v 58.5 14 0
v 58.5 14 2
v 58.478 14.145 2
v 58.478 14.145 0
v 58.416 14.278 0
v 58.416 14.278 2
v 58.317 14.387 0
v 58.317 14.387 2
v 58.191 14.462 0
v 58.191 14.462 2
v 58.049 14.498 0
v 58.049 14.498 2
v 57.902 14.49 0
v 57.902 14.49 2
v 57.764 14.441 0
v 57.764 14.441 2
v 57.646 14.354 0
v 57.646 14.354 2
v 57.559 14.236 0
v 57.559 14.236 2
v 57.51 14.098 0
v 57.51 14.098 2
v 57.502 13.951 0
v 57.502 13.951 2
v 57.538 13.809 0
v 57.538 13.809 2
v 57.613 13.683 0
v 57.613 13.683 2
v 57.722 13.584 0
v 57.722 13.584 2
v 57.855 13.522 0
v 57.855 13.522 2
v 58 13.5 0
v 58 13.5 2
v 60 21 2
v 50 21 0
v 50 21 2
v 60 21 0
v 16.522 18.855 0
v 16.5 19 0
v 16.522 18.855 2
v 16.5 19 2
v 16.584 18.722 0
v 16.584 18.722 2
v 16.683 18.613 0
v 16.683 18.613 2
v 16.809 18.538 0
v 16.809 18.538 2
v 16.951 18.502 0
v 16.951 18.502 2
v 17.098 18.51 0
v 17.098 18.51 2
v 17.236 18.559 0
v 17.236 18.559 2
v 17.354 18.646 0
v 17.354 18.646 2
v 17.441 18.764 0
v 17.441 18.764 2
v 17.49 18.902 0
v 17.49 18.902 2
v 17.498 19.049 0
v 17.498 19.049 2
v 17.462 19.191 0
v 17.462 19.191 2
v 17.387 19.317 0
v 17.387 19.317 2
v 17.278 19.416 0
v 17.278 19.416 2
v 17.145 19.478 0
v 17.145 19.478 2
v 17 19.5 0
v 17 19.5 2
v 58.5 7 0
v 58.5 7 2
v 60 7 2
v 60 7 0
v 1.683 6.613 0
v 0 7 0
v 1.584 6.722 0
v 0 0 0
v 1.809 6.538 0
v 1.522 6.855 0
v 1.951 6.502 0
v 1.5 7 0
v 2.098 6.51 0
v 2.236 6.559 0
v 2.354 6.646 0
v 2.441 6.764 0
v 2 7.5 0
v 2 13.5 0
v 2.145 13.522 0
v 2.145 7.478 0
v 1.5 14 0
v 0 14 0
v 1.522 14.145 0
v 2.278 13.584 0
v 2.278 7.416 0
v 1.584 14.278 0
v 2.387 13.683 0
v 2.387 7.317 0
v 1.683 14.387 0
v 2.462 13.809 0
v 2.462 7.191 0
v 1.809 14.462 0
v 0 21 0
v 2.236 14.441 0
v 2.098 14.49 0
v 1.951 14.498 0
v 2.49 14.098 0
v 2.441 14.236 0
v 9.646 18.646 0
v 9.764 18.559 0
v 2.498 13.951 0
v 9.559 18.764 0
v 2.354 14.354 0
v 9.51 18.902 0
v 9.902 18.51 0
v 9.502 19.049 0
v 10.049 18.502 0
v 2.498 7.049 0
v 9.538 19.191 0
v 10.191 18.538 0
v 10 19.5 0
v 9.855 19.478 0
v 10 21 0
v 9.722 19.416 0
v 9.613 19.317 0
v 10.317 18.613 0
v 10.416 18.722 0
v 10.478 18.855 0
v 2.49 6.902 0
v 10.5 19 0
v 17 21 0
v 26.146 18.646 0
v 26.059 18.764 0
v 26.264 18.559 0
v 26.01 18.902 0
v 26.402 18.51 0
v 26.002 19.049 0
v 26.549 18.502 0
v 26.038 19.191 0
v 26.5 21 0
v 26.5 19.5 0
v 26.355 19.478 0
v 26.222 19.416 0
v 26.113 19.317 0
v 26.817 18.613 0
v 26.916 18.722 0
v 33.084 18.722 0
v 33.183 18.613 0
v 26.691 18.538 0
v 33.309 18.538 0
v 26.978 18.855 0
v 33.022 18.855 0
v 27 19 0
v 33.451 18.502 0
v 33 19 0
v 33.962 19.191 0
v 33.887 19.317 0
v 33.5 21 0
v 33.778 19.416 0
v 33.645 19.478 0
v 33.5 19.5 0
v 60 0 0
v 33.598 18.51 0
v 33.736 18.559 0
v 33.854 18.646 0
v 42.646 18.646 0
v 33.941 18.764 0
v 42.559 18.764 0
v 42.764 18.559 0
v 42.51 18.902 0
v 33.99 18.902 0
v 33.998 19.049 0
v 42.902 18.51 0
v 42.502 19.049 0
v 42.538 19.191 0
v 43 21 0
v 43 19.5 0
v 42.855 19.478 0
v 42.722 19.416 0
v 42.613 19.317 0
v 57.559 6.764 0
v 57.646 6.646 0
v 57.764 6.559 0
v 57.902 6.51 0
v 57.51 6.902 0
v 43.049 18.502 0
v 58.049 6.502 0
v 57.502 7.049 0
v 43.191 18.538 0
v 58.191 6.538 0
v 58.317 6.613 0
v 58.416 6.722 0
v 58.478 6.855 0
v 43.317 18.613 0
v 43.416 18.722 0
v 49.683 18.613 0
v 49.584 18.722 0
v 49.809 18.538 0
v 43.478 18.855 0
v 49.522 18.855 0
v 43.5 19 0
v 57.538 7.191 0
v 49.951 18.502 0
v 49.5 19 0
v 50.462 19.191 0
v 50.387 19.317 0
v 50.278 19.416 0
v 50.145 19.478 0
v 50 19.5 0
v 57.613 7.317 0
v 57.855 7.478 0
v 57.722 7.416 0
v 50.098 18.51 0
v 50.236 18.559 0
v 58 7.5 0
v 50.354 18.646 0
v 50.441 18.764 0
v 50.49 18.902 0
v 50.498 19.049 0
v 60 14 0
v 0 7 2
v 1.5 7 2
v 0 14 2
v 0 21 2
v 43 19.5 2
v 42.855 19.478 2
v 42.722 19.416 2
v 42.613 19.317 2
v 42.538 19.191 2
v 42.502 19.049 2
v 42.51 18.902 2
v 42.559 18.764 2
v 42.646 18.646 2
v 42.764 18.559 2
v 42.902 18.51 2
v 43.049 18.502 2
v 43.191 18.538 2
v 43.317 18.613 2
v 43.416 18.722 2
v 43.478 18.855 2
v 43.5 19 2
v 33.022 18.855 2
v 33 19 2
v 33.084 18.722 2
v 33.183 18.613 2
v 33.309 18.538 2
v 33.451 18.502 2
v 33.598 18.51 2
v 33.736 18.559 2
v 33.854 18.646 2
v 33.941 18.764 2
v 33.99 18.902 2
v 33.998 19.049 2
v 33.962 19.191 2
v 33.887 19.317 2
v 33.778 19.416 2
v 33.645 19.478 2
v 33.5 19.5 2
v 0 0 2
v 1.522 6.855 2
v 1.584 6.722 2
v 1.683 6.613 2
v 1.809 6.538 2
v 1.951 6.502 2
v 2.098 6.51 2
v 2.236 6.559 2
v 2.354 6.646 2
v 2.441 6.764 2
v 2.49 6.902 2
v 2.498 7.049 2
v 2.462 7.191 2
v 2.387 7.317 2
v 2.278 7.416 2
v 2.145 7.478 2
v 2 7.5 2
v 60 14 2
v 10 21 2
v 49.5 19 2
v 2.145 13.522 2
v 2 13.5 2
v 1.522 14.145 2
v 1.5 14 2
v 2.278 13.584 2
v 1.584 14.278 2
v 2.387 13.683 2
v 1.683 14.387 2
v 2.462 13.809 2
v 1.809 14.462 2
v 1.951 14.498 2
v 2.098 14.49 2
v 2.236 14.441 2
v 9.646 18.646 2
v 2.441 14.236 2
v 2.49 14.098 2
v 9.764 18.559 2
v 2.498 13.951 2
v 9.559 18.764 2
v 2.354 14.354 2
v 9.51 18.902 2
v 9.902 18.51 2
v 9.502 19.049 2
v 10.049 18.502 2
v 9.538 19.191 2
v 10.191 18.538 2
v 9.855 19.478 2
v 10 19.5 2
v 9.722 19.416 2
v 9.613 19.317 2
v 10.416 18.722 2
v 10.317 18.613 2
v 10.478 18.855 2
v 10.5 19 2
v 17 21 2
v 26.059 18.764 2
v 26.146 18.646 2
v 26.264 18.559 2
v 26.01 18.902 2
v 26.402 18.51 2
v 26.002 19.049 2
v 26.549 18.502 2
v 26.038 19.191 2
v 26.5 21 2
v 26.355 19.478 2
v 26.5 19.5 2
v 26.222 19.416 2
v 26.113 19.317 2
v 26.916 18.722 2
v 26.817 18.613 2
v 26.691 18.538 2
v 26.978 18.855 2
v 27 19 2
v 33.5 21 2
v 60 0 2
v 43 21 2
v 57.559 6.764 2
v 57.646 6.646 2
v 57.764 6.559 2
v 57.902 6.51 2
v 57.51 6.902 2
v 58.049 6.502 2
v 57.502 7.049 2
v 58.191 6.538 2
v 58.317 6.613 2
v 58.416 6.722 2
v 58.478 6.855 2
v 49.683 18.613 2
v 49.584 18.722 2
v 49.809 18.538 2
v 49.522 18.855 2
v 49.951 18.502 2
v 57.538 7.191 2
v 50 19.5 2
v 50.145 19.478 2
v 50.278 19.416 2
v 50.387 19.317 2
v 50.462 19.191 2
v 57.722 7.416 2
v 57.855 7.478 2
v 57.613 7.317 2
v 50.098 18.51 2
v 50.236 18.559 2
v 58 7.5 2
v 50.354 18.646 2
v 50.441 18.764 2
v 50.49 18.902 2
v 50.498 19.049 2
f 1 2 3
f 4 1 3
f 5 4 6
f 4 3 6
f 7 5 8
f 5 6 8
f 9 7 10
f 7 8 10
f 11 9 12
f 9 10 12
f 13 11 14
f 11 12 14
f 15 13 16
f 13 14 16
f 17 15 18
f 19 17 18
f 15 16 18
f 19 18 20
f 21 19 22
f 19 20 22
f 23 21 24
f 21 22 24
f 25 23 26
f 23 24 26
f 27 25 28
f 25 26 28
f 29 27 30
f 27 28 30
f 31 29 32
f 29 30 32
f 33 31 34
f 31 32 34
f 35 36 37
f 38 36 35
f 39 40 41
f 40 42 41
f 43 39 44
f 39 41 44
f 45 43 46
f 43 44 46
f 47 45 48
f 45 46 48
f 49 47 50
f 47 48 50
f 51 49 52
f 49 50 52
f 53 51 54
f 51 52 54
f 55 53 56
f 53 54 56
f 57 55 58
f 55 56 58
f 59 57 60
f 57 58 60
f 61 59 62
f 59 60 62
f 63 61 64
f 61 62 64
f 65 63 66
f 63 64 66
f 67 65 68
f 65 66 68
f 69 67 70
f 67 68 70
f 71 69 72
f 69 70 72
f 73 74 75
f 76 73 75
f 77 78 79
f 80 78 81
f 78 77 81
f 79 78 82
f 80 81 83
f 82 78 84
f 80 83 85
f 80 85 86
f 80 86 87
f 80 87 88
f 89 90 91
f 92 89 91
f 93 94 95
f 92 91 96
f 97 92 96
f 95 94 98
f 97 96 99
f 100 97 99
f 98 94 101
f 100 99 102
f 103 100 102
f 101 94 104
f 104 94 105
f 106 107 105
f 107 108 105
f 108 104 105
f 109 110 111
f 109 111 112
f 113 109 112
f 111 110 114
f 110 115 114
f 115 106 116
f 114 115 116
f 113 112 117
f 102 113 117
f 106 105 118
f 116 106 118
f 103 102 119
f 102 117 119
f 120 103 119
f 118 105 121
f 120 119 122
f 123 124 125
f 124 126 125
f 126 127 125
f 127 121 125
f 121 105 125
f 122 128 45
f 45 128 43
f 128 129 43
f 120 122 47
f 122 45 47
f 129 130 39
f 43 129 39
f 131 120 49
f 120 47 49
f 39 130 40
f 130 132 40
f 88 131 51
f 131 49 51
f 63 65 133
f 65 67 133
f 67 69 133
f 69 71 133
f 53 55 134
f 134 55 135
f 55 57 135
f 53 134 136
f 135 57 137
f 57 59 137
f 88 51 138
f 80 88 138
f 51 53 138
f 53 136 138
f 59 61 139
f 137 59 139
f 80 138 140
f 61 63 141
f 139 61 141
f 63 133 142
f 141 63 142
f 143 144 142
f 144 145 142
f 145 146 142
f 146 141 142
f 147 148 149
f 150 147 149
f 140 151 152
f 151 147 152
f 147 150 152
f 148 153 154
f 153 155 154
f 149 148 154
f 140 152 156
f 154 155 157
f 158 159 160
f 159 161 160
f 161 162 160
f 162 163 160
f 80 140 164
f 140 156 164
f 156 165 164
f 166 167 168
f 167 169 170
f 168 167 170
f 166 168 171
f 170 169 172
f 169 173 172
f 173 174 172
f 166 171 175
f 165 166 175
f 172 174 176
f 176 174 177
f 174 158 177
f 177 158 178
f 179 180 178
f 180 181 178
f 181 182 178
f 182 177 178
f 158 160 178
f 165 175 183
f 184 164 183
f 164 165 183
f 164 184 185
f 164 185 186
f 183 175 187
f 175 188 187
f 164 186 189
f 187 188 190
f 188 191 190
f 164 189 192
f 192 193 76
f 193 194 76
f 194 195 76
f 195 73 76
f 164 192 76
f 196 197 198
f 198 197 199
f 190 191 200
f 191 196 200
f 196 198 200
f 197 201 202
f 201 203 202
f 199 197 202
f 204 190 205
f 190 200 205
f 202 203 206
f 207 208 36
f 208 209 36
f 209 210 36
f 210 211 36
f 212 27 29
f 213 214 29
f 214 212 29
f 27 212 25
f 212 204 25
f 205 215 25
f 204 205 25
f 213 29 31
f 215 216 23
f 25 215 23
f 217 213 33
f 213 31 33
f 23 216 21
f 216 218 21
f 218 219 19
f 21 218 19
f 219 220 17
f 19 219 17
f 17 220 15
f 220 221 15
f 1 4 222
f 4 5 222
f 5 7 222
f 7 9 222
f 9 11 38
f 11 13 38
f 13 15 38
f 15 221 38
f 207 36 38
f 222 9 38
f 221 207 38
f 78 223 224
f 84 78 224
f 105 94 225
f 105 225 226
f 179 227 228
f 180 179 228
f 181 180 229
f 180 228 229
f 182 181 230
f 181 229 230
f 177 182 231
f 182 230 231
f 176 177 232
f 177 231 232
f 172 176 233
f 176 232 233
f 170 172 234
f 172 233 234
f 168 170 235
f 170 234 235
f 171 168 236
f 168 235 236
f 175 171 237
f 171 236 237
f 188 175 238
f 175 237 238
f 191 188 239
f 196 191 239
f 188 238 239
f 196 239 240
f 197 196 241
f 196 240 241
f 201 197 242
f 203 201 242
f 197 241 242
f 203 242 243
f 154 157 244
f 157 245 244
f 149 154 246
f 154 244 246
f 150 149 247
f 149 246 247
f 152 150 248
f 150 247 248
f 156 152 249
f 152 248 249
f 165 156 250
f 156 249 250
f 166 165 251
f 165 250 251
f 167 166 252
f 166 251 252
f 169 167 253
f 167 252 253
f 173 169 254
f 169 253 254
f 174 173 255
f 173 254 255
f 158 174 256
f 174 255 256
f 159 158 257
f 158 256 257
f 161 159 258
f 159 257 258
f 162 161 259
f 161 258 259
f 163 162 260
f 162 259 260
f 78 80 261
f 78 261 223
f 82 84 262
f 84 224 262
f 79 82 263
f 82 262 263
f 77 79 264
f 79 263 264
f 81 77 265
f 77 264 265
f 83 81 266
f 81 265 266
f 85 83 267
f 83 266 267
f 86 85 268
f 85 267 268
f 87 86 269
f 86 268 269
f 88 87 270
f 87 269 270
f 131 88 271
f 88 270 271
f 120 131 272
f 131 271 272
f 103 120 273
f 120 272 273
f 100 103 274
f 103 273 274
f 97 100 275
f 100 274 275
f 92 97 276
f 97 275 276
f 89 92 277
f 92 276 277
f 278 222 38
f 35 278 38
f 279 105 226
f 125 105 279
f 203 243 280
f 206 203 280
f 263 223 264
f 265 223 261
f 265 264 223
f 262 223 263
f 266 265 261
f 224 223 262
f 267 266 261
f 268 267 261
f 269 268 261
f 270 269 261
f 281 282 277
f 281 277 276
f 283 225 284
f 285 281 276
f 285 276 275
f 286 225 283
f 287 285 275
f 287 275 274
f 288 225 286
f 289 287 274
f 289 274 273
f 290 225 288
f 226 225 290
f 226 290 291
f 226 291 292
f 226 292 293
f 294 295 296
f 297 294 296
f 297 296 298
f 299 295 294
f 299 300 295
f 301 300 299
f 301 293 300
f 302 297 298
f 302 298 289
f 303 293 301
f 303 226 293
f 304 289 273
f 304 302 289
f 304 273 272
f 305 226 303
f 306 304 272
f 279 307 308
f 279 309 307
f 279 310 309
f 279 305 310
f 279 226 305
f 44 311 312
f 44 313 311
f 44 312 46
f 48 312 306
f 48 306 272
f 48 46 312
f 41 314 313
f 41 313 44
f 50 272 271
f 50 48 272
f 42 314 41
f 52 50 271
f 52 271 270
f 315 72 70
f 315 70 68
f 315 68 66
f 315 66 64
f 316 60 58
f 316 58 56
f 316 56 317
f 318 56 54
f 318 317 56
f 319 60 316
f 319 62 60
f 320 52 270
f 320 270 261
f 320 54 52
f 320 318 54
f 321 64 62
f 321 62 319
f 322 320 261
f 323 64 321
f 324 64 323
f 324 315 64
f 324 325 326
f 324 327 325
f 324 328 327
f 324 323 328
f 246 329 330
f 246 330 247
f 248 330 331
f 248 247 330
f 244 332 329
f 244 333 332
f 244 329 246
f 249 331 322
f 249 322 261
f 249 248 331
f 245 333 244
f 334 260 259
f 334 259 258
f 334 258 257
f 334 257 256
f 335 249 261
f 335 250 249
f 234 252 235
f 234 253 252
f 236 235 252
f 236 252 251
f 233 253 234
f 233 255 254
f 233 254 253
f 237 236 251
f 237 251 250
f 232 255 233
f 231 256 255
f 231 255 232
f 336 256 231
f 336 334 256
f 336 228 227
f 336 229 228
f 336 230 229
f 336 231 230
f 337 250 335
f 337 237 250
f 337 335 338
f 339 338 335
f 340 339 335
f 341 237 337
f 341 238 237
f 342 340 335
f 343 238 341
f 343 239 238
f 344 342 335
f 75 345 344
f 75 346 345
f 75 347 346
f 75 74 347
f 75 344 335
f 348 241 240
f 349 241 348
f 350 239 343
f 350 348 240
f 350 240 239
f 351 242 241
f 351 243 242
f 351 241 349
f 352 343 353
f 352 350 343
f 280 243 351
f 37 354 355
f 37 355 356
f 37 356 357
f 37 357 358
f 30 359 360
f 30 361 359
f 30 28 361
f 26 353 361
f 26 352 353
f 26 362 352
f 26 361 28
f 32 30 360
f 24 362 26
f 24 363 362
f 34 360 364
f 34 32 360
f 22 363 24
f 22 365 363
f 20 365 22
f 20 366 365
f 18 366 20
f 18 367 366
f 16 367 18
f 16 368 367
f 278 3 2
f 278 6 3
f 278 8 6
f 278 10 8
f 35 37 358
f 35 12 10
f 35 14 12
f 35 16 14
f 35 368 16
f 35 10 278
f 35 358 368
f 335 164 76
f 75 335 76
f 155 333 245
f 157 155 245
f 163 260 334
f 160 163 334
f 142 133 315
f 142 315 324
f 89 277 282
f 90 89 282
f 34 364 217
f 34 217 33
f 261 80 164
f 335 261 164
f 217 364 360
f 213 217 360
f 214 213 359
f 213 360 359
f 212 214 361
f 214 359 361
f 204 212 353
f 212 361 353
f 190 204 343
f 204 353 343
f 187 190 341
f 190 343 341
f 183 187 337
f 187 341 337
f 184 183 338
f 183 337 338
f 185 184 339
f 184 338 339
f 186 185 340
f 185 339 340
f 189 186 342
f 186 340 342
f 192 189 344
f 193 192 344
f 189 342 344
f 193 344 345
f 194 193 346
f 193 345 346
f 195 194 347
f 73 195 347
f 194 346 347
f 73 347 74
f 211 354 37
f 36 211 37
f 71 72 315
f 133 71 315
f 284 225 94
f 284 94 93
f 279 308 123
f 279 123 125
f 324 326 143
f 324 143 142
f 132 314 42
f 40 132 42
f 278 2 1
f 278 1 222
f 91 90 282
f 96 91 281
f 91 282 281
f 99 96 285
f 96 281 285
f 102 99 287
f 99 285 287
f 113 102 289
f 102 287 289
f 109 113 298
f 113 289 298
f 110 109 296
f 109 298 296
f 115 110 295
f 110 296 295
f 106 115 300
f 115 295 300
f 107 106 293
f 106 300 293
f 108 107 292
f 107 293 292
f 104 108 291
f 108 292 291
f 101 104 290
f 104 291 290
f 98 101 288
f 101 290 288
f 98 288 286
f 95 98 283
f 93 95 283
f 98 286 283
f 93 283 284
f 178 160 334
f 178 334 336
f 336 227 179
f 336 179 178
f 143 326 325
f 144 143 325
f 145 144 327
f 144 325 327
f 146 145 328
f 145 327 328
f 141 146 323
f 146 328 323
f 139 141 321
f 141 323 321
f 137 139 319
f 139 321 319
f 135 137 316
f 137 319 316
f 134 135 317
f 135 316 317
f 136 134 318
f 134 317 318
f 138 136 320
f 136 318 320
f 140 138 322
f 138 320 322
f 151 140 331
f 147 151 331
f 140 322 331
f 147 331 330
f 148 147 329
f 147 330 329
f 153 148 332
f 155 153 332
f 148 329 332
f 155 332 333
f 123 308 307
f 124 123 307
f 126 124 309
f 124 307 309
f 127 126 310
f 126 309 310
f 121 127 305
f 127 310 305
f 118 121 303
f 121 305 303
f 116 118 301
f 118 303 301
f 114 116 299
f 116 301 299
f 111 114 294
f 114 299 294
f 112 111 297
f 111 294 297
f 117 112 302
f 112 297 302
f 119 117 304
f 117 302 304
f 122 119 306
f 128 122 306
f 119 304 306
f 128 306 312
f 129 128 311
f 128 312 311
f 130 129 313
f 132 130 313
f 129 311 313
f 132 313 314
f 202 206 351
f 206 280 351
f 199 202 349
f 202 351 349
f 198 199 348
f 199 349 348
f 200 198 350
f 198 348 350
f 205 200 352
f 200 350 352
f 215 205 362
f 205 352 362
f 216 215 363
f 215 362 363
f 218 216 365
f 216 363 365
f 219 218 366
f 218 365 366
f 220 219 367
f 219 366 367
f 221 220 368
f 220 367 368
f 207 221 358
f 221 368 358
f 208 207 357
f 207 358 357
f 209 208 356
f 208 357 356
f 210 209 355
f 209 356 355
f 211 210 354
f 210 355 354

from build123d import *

# Parameters (mm, degrees)
SKETCH_1_W          = 60
SKETCH_1_H          = 21
EXTRUDE_1_DEPTH     = 2
SKETCH_2_W          = 2
SKETCH_2_H          = 7
CUT_EXTRUDE_1_DEPTH = 64.600314465
SKETCH_3_W          = 7
SKETCH_3_H          = 2
CUT_EXTRUDE_2_DEPTH = 64.600314465
SKETCH_5_R          = 0.5
CUT_EXTRUDE_3_DEPTH = 64.600314465


with BuildPart() as part:
    # 草图1 → 凸台-拉伸1 (new body)
    with BuildSketch(Plane.XY):
        with Locations((30, 10.5)):
            Rectangle(SKETCH_1_W, SKETCH_1_H)
    extrude(amount=EXTRUDE_1_DEPTH)

    # 草图2 → 切除-拉伸1 (cut, through all)
    with BuildSketch(Plane.XY.offset(2)):
        with Locations((1, 10.5)):
            Rectangle(SKETCH_2_W, SKETCH_2_H)
        with Locations((59, 10.5)):
            Rectangle(SKETCH_2_W, SKETCH_2_H)
    extrude(amount=-CUT_EXTRUDE_1_DEPTH, mode=Mode.SUBTRACT)

    # 草图3 → 切除-拉伸2 (cut, through all)
    with BuildSketch(Plane.XY.offset(2)):
        with Locations((13.5, 20)):
            Rectangle(SKETCH_3_W, SKETCH_3_H)
        with Locations((30, 20)):
            Rectangle(SKETCH_3_W, SKETCH_3_H)
        with Locations((46.5, 20)):
            Rectangle(SKETCH_3_W, SKETCH_3_H)
    extrude(amount=-CUT_EXTRUDE_2_DEPTH, mode=Mode.SUBTRACT)

    # 草图5 → 切除-拉伸3 (cut, through all)
    with BuildSketch(Plane.XY.offset(2)):
        with Locations((2, 7)):
            Circle(SKETCH_5_R)
    cut_extrude_3 = extrude(amount=-CUT_EXTRUDE_3_DEPTH, mode=Mode.SUBTRACT)

    # 草图阵列1: 切除-拉伸3 at 9 more places
    with Locations((0, 7, 0), (8, 12, 0), (15, 12, 0), (24.5, 12, 0), (31.5, 12, 0), (41, 12, 0), (48, 12, 0), (56, 7, 0), (56, 0, 0)):
        add(cut_extrude_3, mode=Mode.SUBTRACT)


solid = part.part
